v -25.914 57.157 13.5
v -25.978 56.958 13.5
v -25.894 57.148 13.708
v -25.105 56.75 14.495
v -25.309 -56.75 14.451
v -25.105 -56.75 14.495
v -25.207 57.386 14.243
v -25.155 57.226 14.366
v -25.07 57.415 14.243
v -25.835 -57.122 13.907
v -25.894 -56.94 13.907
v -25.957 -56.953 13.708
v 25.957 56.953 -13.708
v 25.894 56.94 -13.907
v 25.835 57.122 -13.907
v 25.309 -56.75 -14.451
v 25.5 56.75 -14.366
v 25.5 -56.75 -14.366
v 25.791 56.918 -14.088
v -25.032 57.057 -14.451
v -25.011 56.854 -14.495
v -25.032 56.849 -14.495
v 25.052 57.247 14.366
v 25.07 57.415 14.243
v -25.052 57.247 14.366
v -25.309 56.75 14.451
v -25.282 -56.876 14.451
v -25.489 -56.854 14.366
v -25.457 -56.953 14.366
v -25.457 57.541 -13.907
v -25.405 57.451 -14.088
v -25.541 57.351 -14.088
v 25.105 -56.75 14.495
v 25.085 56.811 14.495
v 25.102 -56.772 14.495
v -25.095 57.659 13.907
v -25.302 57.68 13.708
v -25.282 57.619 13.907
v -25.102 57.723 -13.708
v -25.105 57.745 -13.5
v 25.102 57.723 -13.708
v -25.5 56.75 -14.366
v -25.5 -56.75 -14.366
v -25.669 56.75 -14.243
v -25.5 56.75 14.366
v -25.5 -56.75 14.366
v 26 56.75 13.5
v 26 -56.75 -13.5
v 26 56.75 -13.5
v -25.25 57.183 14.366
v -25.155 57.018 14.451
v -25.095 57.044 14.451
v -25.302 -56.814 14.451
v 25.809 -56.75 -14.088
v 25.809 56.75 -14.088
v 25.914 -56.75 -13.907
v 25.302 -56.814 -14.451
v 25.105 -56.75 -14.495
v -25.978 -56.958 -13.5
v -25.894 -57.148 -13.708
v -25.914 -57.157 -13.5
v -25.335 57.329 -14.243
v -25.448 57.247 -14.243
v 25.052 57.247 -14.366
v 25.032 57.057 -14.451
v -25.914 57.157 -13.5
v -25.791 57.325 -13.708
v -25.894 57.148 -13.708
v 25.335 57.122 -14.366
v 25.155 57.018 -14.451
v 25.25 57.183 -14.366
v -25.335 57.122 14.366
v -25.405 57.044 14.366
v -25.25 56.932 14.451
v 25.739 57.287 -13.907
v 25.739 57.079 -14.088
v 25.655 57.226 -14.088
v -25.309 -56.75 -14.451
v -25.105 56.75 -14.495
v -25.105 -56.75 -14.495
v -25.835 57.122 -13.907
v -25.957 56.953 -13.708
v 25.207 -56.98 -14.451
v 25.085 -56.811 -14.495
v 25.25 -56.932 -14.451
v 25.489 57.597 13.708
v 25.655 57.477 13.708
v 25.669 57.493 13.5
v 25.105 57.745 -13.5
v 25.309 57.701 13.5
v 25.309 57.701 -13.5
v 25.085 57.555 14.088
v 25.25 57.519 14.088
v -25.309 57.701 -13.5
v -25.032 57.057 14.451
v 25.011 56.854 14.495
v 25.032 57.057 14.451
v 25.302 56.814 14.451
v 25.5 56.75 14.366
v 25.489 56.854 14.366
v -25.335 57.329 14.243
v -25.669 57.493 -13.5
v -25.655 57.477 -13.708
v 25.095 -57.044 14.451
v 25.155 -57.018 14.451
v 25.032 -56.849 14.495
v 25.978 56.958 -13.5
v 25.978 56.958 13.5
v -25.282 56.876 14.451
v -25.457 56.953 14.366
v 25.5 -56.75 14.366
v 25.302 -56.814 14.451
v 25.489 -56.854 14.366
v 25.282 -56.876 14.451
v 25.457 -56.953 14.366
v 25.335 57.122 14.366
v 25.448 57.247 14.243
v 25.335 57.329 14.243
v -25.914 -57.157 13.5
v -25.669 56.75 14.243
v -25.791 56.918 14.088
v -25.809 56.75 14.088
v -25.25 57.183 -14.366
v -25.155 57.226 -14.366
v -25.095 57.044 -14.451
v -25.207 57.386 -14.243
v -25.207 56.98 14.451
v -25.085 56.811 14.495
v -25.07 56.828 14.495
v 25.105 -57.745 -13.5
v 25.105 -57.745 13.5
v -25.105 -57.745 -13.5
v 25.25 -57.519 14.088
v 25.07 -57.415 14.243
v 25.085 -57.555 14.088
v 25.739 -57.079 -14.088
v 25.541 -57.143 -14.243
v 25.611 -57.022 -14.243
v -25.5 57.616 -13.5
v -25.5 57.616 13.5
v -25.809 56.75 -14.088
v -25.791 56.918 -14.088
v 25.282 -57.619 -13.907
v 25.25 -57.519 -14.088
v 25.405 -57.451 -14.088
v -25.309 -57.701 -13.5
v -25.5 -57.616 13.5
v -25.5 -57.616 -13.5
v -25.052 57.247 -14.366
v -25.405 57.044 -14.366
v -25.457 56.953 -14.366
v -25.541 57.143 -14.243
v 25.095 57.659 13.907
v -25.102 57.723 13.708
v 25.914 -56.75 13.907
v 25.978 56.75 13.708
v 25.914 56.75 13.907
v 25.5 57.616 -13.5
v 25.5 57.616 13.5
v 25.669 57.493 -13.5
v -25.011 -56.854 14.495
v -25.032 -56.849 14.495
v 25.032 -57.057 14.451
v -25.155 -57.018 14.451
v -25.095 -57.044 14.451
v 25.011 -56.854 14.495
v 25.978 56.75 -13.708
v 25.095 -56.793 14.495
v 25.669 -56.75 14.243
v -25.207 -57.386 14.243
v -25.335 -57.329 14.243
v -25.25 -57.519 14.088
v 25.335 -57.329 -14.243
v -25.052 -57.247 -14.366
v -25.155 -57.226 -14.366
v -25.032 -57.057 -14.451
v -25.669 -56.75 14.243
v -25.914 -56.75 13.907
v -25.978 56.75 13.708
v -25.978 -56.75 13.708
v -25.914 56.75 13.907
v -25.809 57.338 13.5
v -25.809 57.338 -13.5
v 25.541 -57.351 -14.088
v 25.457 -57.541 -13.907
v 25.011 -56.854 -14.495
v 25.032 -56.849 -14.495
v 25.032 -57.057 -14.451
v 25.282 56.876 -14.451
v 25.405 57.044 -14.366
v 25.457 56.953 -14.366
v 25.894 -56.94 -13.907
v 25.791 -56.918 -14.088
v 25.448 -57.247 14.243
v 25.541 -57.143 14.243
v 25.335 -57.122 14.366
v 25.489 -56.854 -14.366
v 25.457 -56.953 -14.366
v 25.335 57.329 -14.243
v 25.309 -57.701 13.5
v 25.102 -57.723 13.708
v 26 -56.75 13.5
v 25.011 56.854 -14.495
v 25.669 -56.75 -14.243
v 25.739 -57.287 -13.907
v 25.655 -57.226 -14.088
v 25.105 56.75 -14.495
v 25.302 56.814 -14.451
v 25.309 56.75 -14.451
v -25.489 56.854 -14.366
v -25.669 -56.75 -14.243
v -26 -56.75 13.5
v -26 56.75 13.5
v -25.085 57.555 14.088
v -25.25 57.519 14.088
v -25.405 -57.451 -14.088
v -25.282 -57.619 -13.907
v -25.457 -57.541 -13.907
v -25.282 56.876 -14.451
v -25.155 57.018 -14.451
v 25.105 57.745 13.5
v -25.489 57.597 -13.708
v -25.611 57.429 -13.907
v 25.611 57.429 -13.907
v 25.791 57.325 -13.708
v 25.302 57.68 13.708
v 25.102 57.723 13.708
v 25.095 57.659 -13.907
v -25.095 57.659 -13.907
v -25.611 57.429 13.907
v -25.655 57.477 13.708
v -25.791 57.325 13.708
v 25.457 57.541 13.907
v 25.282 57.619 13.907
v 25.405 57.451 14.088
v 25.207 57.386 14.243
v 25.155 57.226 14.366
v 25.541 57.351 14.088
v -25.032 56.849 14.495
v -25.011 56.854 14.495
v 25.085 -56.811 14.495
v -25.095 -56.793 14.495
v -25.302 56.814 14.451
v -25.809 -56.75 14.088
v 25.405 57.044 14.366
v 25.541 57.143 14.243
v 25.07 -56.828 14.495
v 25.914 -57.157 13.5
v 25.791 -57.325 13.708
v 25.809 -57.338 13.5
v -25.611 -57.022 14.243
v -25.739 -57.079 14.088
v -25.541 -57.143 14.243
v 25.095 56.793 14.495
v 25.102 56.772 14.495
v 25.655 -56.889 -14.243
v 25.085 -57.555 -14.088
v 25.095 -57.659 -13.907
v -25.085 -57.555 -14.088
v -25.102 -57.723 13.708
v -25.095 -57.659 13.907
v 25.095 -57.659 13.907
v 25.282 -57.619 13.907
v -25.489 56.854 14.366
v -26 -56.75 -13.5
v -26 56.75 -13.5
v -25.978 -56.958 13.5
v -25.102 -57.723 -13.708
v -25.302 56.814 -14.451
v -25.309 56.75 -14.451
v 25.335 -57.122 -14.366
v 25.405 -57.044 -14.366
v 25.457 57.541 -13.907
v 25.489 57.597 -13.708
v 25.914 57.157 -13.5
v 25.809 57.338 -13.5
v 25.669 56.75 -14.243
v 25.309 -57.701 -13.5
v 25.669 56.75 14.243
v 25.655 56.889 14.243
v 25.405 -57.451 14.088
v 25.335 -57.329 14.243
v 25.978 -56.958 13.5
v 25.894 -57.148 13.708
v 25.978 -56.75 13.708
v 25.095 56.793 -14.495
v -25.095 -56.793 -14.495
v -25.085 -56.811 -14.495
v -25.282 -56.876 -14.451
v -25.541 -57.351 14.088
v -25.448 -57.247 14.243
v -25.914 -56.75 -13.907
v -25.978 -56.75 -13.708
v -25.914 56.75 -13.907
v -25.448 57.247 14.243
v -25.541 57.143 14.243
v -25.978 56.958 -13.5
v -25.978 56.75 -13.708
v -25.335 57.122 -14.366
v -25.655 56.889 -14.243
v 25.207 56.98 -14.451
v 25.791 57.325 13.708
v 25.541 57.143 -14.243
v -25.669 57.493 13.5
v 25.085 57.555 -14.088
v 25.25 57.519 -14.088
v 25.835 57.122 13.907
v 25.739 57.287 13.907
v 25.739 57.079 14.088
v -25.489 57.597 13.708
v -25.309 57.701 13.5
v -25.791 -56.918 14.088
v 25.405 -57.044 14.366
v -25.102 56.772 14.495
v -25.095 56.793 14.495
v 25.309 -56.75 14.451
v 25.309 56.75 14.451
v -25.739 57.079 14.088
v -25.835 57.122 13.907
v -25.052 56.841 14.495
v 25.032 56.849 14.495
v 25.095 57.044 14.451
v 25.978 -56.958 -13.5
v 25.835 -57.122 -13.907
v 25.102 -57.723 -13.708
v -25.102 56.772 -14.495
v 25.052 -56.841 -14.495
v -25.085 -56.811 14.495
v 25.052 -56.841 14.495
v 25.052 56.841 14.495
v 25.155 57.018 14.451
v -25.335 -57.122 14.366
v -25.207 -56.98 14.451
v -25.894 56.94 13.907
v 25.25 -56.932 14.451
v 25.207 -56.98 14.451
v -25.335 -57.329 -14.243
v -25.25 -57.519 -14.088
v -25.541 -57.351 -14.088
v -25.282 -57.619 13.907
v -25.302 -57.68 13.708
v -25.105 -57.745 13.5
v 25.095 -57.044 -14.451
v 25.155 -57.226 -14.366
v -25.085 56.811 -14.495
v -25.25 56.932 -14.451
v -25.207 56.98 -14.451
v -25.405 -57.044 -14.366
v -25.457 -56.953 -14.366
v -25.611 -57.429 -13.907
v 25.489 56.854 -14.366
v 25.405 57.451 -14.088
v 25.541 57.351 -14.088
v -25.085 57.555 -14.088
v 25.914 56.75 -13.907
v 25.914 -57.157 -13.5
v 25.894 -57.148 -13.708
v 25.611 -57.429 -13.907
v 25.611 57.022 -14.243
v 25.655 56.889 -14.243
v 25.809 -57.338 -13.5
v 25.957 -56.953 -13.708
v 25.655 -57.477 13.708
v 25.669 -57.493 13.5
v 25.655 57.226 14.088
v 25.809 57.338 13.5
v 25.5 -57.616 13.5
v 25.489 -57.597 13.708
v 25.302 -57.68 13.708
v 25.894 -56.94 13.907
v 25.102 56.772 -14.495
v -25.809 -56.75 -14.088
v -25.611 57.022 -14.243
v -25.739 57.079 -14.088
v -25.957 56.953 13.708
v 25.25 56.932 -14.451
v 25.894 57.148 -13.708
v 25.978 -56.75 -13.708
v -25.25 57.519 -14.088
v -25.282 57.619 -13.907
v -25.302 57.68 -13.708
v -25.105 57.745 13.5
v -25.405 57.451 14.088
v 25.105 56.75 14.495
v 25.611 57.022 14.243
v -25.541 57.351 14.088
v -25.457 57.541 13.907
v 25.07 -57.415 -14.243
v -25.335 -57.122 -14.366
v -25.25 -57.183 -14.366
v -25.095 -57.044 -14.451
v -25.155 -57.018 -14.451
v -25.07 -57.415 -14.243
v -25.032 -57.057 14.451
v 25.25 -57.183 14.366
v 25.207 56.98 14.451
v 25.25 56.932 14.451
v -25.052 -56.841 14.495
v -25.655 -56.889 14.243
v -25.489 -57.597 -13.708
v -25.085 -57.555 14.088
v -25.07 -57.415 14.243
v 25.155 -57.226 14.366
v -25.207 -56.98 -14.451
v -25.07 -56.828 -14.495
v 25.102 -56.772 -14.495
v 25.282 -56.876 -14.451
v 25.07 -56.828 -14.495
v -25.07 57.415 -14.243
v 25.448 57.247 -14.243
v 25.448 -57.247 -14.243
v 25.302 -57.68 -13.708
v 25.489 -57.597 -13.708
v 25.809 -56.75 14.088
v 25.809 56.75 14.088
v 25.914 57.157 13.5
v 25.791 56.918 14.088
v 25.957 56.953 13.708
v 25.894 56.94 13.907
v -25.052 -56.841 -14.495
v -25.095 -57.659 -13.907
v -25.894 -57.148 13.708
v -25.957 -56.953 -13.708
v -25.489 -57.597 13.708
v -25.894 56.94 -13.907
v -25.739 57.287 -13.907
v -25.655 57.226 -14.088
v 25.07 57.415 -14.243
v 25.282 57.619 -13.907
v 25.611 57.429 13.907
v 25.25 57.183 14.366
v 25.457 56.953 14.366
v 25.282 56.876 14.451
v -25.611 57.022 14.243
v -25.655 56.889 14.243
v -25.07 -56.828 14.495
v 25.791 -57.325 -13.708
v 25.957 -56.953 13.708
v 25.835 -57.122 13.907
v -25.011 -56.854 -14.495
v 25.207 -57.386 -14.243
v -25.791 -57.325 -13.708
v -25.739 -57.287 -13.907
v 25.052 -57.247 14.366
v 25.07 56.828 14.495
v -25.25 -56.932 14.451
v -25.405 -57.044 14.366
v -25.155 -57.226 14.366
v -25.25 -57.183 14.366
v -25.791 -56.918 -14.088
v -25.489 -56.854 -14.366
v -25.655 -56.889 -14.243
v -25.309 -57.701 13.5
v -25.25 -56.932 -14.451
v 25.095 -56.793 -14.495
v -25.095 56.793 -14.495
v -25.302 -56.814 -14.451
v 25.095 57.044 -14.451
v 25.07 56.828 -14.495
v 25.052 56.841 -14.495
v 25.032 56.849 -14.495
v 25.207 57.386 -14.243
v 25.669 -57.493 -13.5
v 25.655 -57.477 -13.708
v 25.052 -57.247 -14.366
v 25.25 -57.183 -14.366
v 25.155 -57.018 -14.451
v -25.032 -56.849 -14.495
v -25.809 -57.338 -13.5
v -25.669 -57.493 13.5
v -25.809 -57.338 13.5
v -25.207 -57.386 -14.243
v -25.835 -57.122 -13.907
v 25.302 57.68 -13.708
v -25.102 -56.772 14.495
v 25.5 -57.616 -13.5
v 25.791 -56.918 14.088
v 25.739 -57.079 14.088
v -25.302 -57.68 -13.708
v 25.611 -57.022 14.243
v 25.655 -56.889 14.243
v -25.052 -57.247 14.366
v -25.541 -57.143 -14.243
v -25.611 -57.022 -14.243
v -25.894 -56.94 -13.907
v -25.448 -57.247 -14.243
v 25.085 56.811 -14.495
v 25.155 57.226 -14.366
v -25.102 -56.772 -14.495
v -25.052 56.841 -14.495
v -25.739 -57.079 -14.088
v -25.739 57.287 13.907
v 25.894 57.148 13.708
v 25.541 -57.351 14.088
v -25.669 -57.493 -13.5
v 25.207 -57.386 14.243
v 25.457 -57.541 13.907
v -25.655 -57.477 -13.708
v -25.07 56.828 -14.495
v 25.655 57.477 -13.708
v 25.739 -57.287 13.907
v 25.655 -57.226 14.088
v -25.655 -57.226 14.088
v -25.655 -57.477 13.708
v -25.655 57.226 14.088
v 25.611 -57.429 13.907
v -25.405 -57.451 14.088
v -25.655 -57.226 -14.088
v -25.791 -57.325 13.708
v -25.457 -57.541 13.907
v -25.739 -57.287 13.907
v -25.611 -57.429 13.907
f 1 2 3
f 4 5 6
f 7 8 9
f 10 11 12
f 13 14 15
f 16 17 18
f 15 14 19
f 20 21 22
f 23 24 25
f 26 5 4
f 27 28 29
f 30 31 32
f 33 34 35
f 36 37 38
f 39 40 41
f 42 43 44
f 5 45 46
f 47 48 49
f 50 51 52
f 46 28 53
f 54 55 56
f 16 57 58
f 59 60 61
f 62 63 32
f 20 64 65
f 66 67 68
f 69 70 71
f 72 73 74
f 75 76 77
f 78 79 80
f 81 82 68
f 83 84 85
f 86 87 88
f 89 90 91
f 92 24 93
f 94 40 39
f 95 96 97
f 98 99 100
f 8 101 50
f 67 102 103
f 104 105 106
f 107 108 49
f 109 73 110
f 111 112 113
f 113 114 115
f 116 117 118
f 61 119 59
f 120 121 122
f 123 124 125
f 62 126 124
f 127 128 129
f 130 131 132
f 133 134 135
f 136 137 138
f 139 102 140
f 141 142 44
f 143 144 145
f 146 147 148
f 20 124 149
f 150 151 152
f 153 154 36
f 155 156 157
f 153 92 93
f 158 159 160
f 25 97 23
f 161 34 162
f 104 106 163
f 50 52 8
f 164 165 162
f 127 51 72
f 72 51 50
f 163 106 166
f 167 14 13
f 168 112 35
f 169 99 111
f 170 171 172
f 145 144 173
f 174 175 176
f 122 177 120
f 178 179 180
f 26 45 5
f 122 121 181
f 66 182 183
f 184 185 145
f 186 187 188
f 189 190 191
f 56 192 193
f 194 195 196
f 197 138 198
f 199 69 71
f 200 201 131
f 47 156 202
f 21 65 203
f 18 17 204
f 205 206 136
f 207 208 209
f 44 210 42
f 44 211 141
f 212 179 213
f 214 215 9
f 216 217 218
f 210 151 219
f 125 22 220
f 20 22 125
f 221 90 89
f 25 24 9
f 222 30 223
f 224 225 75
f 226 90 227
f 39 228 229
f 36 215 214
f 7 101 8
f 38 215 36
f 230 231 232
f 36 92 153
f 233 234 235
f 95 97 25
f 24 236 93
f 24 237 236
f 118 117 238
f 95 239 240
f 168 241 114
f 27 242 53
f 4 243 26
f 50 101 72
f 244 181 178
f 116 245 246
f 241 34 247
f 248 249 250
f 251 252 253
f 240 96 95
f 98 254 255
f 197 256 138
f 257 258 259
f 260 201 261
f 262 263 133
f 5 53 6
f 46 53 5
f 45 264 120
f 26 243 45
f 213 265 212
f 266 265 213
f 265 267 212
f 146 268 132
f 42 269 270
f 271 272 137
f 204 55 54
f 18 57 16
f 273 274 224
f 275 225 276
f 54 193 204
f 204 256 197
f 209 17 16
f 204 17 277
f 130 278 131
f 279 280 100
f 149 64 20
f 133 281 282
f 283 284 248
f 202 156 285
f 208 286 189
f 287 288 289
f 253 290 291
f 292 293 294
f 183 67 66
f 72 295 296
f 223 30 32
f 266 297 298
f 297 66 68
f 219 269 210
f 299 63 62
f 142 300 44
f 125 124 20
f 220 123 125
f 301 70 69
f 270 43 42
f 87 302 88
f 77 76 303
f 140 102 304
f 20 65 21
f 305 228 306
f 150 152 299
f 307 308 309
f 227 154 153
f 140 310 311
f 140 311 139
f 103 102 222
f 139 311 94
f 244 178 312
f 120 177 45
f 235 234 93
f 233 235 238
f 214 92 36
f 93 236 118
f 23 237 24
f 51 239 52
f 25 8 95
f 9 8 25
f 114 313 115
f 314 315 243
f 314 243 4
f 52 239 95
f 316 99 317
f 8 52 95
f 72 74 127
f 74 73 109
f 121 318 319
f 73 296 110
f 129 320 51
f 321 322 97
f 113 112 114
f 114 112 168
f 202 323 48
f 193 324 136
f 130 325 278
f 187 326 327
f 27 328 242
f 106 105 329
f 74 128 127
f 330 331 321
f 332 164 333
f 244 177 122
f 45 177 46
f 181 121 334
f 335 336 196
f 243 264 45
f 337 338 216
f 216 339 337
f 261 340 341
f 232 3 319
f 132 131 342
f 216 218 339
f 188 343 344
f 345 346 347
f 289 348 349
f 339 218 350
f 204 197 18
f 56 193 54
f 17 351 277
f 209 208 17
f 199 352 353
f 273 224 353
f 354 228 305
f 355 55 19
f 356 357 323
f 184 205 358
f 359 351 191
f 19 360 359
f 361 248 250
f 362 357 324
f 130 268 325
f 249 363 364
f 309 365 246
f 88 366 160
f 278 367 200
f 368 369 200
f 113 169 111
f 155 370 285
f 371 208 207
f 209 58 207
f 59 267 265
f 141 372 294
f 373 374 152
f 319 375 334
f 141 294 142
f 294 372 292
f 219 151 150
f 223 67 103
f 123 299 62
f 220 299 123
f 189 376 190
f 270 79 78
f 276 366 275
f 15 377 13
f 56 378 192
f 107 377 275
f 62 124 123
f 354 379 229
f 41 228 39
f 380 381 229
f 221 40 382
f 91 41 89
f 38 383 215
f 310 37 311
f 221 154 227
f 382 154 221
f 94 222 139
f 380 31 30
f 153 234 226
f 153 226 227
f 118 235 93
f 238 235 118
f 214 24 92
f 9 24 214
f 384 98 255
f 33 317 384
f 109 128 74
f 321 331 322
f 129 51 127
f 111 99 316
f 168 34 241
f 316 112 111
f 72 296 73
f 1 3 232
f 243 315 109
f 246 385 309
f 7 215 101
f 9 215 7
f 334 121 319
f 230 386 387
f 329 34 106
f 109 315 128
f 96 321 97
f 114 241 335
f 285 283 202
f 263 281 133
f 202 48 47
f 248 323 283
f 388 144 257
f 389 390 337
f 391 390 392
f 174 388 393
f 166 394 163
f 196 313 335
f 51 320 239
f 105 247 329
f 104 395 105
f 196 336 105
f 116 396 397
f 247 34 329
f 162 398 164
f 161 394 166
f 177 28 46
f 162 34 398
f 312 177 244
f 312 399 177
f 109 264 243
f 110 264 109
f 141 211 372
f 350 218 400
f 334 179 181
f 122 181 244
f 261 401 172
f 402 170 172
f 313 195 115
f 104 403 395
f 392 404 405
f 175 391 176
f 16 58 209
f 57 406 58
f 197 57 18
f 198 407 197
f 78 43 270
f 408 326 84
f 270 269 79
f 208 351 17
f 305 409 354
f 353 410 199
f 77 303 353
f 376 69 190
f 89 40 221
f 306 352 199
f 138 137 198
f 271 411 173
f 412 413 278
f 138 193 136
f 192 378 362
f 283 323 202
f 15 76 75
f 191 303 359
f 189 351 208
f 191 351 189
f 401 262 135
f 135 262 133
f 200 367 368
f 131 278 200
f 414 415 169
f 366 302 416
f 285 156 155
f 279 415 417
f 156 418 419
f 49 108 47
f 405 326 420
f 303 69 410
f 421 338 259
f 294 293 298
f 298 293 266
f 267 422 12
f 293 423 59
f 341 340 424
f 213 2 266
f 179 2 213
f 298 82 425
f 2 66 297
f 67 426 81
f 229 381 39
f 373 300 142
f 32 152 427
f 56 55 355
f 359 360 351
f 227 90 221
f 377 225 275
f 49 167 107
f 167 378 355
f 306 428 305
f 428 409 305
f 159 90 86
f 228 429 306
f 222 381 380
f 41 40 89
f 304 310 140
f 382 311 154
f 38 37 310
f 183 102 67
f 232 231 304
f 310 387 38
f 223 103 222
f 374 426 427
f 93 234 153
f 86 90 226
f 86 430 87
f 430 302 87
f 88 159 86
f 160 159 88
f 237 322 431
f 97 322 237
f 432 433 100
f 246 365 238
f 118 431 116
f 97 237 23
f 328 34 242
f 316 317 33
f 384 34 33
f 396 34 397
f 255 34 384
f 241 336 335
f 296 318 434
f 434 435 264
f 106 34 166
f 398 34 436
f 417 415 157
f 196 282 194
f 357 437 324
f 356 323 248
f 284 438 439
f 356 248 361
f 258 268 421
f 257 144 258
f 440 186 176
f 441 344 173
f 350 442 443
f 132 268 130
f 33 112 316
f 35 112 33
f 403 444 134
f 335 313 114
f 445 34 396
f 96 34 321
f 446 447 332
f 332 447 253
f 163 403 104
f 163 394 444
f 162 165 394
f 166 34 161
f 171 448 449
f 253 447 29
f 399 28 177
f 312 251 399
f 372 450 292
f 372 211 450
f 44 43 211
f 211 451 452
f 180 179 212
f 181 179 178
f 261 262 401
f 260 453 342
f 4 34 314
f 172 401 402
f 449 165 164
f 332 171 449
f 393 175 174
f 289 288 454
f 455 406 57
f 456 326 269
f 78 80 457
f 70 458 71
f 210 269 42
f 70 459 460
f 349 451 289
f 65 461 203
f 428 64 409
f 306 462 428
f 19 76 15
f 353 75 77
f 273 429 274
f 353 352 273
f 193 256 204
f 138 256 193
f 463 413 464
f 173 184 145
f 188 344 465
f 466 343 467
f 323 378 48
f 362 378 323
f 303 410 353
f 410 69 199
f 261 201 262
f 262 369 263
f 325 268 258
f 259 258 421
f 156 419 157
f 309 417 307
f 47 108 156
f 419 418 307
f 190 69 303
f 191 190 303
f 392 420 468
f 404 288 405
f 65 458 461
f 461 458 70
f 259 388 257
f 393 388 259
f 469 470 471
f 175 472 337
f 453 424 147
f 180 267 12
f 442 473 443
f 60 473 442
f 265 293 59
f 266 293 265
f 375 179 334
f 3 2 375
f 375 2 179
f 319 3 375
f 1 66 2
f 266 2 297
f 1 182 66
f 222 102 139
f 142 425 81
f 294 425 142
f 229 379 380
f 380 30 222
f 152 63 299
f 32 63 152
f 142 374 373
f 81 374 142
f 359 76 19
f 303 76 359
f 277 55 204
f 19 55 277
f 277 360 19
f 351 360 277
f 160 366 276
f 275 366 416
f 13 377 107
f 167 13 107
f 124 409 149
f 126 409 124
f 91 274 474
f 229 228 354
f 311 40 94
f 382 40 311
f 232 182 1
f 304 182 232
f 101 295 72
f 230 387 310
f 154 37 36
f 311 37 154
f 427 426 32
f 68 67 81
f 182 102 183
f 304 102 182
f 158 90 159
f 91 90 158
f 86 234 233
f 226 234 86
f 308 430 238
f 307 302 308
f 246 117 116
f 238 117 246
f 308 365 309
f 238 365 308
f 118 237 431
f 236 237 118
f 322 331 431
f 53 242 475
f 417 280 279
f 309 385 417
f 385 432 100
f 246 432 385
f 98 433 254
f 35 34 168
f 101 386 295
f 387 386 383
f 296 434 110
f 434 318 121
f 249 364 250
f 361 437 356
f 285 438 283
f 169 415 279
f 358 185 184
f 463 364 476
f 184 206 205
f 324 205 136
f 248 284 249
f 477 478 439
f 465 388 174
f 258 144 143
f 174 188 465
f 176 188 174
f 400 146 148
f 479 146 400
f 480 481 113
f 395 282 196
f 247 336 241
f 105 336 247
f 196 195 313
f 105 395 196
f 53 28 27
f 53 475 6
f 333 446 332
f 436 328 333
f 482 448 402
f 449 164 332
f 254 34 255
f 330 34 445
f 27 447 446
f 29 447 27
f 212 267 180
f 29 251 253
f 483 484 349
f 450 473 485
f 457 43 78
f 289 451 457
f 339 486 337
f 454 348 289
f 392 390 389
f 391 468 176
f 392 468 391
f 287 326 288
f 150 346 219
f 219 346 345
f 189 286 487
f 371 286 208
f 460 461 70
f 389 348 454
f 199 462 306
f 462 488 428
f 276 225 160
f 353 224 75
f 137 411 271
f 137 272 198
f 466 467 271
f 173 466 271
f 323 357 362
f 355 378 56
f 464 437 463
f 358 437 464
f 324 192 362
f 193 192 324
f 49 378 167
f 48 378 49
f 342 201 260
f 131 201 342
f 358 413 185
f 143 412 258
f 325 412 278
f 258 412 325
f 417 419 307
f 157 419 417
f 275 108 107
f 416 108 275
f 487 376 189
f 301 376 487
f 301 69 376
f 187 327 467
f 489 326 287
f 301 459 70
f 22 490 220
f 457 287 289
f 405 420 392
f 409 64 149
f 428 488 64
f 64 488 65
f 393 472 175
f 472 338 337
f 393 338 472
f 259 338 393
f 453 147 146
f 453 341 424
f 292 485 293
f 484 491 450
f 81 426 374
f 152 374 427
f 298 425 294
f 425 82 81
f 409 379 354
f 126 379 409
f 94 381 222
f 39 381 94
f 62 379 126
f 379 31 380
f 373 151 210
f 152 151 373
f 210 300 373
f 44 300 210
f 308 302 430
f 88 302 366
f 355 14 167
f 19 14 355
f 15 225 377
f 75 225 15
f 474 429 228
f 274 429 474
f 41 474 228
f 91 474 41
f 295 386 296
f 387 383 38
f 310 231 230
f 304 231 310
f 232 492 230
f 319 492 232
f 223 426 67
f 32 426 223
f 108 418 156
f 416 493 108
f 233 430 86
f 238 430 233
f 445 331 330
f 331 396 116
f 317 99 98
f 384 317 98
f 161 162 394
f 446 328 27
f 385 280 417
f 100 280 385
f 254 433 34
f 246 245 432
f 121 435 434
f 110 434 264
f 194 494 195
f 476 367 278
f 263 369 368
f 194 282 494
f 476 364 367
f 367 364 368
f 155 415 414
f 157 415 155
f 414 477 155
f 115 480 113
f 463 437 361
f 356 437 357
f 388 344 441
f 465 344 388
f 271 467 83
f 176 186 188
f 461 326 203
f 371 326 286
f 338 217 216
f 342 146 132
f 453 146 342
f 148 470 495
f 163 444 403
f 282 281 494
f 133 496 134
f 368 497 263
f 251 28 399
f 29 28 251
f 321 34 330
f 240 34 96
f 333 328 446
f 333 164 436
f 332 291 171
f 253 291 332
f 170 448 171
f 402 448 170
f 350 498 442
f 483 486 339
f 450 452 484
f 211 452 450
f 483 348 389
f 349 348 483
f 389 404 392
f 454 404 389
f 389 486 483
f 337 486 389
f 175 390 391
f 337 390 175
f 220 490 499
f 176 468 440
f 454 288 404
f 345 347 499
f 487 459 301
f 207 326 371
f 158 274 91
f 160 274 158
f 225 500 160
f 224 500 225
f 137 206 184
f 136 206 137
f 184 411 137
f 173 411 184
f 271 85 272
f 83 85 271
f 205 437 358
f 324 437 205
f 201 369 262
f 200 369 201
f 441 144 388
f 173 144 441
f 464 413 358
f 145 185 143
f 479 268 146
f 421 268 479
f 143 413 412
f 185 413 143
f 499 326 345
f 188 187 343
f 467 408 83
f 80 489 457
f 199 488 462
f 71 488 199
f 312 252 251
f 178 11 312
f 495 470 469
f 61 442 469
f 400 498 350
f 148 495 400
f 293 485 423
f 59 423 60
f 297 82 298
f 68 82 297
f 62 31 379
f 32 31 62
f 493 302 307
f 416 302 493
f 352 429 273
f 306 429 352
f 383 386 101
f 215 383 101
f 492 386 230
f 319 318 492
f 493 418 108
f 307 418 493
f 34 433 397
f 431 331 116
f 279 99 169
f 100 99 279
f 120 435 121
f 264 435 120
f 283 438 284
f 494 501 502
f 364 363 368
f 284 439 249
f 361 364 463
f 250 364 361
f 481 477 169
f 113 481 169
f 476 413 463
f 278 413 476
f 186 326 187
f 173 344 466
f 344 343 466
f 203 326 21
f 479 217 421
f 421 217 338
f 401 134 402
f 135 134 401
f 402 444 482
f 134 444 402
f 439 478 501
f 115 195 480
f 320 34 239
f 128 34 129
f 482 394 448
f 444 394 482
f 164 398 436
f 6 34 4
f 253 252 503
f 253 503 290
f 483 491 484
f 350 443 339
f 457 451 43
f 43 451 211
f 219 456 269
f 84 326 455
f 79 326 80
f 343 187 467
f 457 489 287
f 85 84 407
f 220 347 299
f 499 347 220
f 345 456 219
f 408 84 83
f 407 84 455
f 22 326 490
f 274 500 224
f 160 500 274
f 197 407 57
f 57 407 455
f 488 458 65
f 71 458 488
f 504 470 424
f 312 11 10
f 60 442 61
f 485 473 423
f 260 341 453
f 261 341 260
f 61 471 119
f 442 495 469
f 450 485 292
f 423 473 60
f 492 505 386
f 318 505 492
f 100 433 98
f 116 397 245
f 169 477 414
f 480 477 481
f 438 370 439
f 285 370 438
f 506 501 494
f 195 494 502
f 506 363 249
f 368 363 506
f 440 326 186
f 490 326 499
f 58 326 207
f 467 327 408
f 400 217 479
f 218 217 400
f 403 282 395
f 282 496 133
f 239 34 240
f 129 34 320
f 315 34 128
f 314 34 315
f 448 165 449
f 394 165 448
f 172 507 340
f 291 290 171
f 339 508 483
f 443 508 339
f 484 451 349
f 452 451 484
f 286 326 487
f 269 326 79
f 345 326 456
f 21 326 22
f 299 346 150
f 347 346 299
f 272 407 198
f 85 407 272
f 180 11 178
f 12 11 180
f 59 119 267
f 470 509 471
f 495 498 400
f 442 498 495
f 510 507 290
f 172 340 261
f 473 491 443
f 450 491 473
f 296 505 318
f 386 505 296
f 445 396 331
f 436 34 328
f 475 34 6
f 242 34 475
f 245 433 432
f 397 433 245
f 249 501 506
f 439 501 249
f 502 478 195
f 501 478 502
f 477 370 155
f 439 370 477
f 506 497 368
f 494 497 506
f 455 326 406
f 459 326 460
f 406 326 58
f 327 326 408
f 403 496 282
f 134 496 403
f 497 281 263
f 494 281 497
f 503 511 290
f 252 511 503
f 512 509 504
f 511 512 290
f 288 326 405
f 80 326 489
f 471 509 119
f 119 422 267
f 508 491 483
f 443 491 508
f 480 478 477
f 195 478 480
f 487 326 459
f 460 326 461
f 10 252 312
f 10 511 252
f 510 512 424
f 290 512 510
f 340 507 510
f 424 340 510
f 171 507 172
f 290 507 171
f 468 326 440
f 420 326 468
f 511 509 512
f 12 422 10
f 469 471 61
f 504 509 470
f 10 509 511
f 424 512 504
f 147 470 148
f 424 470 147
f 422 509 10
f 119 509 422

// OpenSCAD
// Laser measure recreation
// John Bargman & Colin 2020-11-19

// All measurements in millimeters

//Set to height detail only for rendering:
$fn= $preview == true? 20 : 30;
minkowskiRound = 1;

Width=52;
Depth=115.5;
Height=29;

Tolerance = 0.2;
origin = [0,0,0];

module Laser_Measure()
{
    translate(origin)
      union()
      {
          minkowski()
          {
            cube([Width - (minkowskiRound*2), Depth- (minkowskiRound*2), Height- (minkowskiRound*2)], center = true); 
            sphere(r=minkowskiRound);    
          }
      }
}

Laser_Measure();
